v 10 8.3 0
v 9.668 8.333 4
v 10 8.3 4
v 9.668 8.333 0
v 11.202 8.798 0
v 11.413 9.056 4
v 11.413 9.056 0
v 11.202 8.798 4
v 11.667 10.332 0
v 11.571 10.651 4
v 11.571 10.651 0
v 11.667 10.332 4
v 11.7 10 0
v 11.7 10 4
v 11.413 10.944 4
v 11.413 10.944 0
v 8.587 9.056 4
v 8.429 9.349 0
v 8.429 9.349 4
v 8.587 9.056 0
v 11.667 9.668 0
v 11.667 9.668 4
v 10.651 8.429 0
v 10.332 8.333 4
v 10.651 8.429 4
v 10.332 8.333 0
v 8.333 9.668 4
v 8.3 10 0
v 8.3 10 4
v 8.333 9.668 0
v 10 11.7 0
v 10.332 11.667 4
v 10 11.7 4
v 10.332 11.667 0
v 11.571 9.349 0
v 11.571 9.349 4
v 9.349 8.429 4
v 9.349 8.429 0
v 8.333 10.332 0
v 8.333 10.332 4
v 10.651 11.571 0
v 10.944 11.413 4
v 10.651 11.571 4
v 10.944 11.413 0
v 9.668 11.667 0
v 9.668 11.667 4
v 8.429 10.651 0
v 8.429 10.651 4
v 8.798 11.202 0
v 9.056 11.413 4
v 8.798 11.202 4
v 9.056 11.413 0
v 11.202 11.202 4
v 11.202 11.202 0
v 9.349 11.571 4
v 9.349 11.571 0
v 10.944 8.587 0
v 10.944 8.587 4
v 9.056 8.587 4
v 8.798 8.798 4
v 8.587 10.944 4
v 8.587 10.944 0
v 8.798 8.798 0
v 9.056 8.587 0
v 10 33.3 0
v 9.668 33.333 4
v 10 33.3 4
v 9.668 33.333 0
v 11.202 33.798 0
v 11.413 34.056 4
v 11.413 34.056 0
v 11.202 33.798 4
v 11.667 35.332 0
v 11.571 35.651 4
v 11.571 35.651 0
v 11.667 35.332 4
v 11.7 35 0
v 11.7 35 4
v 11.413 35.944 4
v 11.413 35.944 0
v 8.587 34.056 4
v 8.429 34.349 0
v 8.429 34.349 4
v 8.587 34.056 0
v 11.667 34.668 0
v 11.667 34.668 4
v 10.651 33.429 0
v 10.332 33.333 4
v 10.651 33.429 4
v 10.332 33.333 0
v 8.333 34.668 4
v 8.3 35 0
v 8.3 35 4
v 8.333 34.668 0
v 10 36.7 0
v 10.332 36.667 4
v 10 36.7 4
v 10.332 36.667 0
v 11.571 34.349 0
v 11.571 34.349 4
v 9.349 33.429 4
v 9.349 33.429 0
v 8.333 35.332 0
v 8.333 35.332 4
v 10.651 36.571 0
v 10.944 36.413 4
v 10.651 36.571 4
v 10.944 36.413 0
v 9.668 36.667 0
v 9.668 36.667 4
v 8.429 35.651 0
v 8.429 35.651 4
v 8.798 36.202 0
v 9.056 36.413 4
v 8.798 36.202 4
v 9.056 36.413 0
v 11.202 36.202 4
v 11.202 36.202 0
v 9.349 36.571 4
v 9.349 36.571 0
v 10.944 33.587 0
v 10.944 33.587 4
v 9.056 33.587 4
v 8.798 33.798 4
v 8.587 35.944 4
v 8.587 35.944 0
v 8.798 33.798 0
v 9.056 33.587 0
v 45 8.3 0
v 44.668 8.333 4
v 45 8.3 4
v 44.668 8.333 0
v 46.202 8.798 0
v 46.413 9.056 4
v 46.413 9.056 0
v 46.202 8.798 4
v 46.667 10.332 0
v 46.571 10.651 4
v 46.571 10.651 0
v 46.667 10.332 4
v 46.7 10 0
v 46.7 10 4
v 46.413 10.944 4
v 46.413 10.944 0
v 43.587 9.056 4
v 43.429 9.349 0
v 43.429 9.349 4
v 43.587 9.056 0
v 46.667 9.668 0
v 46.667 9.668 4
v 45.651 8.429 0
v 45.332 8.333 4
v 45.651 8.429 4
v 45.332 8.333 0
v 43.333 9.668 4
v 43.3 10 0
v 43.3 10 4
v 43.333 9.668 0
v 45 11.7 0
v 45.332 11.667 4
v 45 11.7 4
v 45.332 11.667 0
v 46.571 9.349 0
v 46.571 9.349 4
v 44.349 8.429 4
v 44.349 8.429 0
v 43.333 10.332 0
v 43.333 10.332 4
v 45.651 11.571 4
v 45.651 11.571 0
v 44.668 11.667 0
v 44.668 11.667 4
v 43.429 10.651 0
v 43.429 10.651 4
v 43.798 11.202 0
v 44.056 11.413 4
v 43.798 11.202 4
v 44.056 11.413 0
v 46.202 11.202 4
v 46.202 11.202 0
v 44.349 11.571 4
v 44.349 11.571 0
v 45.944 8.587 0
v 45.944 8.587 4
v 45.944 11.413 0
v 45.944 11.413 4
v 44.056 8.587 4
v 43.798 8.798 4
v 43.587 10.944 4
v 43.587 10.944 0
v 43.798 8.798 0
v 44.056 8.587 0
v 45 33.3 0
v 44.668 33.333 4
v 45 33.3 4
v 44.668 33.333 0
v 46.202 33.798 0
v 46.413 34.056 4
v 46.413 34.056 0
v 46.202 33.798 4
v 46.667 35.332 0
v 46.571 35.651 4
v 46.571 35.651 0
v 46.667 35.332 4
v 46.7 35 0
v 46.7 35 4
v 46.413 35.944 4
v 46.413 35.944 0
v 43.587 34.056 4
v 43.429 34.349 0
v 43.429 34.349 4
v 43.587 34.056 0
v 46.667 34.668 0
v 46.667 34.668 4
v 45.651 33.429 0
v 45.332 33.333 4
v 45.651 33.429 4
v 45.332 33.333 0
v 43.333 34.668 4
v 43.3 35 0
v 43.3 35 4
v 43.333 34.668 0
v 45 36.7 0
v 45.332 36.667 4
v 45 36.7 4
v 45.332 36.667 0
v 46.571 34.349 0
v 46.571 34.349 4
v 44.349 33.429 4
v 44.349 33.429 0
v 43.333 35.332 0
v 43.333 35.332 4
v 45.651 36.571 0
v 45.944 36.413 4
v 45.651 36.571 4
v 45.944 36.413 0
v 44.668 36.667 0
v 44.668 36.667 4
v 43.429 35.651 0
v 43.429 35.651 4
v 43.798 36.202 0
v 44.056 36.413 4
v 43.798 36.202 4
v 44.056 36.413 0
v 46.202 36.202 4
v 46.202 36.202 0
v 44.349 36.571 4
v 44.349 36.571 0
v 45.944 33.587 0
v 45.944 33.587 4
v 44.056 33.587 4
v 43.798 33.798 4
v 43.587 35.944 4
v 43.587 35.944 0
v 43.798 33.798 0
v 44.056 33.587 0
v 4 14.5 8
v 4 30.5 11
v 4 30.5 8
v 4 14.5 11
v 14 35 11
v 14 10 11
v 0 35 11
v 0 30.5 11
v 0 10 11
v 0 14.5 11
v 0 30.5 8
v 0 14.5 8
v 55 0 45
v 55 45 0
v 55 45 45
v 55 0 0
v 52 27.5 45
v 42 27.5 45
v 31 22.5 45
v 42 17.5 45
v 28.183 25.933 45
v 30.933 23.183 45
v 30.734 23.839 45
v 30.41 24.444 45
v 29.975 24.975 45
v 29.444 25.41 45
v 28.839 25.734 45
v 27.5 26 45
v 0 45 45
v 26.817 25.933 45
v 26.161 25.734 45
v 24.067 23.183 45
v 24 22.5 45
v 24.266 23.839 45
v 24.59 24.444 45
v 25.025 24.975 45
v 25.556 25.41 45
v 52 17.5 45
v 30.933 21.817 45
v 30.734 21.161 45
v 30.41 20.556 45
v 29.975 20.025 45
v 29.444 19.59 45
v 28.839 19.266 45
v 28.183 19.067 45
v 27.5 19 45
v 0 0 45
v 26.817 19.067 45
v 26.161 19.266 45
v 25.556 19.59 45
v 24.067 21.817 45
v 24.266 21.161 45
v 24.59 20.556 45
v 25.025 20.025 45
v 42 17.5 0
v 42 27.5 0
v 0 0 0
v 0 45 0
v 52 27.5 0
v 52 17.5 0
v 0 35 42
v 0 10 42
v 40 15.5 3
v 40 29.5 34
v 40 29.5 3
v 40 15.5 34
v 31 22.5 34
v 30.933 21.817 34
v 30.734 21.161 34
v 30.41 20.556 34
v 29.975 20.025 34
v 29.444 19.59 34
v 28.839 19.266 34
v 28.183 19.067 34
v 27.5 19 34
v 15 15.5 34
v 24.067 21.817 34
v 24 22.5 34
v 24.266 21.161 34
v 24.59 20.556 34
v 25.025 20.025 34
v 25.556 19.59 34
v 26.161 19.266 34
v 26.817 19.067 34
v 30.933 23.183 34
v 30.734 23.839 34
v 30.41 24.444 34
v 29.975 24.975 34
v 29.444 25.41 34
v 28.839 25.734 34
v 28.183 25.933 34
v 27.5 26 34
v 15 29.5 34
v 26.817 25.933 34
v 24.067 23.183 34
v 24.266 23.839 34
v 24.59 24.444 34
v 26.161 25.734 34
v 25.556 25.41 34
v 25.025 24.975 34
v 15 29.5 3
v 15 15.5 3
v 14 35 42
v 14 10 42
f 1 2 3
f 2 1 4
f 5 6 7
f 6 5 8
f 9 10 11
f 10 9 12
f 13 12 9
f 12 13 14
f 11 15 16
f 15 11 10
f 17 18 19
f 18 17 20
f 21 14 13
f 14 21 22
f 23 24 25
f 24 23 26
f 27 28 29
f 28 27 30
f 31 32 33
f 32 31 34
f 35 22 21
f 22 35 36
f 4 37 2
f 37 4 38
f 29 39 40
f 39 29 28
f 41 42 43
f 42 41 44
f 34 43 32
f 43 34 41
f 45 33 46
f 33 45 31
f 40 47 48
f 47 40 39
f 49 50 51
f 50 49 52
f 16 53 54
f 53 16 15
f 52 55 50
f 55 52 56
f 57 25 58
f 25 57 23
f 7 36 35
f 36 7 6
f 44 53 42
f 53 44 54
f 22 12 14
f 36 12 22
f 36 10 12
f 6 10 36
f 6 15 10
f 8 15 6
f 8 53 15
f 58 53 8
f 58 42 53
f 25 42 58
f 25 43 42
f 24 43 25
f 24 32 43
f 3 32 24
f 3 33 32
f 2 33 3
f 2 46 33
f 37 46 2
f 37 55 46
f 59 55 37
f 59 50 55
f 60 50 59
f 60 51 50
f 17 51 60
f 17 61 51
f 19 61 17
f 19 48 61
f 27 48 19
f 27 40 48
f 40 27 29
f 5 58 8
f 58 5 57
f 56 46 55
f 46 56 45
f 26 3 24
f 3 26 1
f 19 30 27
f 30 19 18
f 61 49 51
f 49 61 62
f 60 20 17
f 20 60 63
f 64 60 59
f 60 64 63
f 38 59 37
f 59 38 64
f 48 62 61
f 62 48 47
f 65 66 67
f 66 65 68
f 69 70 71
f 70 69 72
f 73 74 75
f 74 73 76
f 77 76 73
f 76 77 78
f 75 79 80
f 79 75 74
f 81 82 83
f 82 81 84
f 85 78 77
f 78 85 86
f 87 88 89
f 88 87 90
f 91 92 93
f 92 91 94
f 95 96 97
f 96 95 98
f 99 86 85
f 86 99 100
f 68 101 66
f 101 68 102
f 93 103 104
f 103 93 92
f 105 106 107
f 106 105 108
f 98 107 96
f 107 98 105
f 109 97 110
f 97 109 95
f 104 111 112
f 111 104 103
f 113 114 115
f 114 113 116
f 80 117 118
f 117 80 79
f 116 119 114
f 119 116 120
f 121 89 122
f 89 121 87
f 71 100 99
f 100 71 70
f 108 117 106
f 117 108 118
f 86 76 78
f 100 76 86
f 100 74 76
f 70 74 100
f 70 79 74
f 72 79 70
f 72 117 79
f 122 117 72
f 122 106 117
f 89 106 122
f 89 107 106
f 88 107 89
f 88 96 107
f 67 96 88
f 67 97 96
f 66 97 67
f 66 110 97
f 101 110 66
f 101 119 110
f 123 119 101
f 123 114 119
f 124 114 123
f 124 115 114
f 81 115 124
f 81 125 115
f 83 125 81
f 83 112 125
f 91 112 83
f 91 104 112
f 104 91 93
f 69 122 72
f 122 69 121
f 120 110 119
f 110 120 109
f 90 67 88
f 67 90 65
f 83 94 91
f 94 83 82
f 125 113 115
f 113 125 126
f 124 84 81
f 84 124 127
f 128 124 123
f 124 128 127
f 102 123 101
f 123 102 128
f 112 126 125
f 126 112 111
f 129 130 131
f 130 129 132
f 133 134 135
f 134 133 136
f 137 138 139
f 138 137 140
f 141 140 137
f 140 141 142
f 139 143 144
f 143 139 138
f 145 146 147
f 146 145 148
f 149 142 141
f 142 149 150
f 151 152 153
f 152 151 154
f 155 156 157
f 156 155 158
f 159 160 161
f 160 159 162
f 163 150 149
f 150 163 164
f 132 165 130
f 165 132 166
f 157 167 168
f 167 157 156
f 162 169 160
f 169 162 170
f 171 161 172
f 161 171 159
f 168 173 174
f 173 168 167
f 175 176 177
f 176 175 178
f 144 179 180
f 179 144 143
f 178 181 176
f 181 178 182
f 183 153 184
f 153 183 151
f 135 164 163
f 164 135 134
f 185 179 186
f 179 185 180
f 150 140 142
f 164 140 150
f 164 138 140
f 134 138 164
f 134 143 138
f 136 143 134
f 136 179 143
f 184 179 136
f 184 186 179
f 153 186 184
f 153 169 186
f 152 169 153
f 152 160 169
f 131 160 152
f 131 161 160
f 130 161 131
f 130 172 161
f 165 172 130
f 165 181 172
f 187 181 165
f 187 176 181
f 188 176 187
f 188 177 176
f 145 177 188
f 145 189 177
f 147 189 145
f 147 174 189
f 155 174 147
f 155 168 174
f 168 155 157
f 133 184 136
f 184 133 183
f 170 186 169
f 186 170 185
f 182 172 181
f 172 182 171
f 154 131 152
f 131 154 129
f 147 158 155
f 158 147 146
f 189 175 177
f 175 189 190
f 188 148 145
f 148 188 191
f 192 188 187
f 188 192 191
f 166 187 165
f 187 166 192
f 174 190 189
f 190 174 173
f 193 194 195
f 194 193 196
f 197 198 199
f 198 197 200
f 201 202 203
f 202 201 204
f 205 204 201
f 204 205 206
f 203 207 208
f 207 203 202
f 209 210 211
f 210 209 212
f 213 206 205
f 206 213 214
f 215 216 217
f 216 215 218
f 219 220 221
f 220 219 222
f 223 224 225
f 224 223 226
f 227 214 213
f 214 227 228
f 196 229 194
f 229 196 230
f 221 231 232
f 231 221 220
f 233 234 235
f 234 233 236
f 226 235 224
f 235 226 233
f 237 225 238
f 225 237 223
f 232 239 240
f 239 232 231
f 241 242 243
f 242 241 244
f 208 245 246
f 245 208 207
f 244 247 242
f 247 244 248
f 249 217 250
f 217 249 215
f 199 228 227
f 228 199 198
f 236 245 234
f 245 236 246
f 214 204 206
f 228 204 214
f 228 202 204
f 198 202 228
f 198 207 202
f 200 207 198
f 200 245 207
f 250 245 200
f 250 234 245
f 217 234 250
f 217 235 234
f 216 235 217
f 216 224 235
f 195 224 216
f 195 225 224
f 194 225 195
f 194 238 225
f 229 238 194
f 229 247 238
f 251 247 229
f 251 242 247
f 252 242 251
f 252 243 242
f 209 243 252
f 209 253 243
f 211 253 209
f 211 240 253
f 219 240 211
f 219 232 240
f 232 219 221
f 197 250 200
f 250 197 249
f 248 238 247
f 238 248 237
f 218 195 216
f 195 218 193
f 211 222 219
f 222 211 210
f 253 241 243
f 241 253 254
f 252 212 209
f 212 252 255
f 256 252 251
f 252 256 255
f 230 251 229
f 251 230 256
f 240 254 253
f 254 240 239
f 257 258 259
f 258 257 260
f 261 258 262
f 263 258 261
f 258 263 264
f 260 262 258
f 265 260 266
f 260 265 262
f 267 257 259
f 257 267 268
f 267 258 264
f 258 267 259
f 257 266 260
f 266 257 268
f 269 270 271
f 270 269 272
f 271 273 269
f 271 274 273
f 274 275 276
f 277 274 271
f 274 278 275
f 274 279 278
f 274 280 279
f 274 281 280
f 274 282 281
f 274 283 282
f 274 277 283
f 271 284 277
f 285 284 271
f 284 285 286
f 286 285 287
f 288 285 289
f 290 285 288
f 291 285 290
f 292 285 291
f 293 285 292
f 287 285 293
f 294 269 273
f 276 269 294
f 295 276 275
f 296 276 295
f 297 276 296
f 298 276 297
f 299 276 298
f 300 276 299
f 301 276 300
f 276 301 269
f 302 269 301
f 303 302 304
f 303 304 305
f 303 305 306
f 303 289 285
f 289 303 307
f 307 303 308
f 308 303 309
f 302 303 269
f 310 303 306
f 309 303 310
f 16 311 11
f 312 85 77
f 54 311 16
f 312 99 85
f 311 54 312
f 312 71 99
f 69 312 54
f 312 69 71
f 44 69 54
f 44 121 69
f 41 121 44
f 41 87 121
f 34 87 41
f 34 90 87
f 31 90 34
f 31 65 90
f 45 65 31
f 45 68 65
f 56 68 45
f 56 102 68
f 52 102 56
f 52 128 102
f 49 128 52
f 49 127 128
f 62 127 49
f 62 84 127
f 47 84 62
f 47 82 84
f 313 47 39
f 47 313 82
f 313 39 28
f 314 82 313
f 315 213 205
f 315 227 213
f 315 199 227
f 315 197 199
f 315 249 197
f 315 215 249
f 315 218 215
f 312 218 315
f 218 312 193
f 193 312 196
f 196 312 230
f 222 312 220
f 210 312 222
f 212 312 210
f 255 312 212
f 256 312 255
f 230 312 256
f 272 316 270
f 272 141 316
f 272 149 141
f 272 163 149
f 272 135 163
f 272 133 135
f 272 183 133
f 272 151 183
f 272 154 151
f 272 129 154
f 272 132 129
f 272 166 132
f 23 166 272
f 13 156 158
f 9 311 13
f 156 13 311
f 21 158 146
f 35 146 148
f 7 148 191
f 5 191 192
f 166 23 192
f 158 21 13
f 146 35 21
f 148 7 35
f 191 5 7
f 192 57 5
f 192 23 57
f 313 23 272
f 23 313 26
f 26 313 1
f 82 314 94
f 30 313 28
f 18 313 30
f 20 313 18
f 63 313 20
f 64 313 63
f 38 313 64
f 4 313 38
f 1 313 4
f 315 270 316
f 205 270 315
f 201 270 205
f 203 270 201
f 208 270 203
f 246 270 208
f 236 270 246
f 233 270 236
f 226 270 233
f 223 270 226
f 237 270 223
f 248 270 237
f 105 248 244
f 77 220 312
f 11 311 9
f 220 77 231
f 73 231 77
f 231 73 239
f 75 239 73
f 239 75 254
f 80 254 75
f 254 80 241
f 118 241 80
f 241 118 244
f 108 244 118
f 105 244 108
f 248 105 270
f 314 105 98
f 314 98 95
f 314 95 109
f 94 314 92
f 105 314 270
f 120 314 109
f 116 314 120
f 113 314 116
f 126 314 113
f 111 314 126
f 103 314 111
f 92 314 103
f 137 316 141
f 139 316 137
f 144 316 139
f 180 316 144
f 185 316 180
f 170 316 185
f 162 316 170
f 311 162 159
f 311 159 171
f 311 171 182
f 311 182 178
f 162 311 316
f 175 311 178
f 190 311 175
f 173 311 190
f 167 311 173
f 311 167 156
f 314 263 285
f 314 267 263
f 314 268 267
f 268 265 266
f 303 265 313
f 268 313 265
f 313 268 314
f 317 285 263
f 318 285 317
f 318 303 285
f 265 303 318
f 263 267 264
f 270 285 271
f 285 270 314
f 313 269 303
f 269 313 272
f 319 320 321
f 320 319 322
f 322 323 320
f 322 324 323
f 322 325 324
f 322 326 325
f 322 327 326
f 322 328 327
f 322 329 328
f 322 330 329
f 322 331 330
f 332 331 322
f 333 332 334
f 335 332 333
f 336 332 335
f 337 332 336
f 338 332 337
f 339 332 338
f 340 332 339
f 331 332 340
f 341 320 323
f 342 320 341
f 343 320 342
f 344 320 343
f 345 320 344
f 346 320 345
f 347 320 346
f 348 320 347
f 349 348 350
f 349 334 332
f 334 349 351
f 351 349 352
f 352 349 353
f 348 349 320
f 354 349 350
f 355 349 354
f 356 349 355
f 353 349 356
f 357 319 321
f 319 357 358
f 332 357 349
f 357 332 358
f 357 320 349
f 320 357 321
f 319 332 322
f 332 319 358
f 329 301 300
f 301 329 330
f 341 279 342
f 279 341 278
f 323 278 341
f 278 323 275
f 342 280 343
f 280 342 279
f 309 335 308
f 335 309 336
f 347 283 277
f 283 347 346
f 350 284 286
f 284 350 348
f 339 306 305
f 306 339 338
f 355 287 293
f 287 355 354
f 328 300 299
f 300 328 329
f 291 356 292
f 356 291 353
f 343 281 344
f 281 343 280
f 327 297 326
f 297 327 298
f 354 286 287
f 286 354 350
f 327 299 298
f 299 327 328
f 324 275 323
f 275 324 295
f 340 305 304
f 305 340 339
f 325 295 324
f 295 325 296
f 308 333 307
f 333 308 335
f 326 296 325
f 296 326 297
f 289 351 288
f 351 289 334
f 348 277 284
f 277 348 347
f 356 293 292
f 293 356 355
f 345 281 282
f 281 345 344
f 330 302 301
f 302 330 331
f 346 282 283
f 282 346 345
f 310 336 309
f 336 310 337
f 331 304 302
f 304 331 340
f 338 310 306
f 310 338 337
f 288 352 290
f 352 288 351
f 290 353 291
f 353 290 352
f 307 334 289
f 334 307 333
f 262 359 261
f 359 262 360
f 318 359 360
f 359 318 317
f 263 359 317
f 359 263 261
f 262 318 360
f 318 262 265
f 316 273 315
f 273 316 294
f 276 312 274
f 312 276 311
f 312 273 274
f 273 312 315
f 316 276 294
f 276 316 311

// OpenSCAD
// ============================================================
// PAN-TILT HOUSING - Double servo SG90
// Dimensions: 55mm(L) × 45mm(l) × 45mm(H)
// Servo SG90 corps: 23mm × 12.5mm × 29mm
// Servo PAN: rotation horizontale (bas)
// Servo TILT: inclinaison verticale (haut)
// Canal câbles intégré + 4 trous M3 pour fixation sur pince
// ============================================================

$fn = 32;

// Paramètres boîtier
HW = 55;   // Largeur
HD = 45;   // Profondeur
HH = 45;   // Hauteur
WT = 3;    // Épaisseur paroi

// Servo SG90 dimensions (avec 1mm jeu)
SG_W = 25;    // 23 + 2mm jeu
SG_D = 14;    // 12.5 + 1.5mm jeu
SG_H = 31;    // 29 + 2mm jeu
AXIS_D = 7;   // Diamètre trou axe servo

CABLE_W = 10; // Canal câbles
SCREW_D = 3.4; // Trou vis M3

module pan_tilt_housing() {
    difference() {
        // Corps principal
        cube([HW, HD, HH]);

        // ---- SERVO PAN (bas, rotation horizontale) ----
        // Logement centré en bas
        translate([(HW - SG_W)/2, (HD - SG_D)/2, WT])
            cube([SG_W, SG_D, SG_H]);

        // Trou d'axe PAN (vertical, depuis le haut)
        translate([HW/2, HD/2, WT + SG_H - 2])
            cylinder(d = AXIS_D, h = HH - SG_H);

        // ---- SERVO TILT (haut, dans paroi latérale gauche) ----
        // Logement dans la paroi gauche, centré en Y
        translate([-1, (HD - SG_W)/2, HH - SG_H - WT])
            cube([SG_D + 1, SG_W, SG_H]);

        // Trou d'axe TILT (horizontal, traversant vers la droite)
        translate([SG_D + 1, HD/2, HH - SG_H/2 - WT])
            rotate([0, 90, 0])
                cylinder(d = AXIS_D, h = 10);

        // ---- Canal câbles vertical (10×10mm) côté droit ----
        translate([HW - WT - CABLE_W, HD/2 - CABLE_W/2, -1])
            cube([CABLE_W, CABLE_W, HH + 2]);

        // ---- 4 trous M3 base pour vissage sur pince ----
        for (pos = [[10, 10], [10, HD-10], [HW-10, 10], [HW-10, HD-10]]) {
            translate([pos[0], pos[1], -1])
                cylinder(d = SCREW_D, h = WT + 2);
        }

        // ---- Ouverture ventilation face avant ----
        for (z = [8, 18, 28]) {
            translate([-1, HD/2 - 8, z])
                cube([WT + 2, 16, 3]);
        }
    }
}

pan_tilt_housing();
